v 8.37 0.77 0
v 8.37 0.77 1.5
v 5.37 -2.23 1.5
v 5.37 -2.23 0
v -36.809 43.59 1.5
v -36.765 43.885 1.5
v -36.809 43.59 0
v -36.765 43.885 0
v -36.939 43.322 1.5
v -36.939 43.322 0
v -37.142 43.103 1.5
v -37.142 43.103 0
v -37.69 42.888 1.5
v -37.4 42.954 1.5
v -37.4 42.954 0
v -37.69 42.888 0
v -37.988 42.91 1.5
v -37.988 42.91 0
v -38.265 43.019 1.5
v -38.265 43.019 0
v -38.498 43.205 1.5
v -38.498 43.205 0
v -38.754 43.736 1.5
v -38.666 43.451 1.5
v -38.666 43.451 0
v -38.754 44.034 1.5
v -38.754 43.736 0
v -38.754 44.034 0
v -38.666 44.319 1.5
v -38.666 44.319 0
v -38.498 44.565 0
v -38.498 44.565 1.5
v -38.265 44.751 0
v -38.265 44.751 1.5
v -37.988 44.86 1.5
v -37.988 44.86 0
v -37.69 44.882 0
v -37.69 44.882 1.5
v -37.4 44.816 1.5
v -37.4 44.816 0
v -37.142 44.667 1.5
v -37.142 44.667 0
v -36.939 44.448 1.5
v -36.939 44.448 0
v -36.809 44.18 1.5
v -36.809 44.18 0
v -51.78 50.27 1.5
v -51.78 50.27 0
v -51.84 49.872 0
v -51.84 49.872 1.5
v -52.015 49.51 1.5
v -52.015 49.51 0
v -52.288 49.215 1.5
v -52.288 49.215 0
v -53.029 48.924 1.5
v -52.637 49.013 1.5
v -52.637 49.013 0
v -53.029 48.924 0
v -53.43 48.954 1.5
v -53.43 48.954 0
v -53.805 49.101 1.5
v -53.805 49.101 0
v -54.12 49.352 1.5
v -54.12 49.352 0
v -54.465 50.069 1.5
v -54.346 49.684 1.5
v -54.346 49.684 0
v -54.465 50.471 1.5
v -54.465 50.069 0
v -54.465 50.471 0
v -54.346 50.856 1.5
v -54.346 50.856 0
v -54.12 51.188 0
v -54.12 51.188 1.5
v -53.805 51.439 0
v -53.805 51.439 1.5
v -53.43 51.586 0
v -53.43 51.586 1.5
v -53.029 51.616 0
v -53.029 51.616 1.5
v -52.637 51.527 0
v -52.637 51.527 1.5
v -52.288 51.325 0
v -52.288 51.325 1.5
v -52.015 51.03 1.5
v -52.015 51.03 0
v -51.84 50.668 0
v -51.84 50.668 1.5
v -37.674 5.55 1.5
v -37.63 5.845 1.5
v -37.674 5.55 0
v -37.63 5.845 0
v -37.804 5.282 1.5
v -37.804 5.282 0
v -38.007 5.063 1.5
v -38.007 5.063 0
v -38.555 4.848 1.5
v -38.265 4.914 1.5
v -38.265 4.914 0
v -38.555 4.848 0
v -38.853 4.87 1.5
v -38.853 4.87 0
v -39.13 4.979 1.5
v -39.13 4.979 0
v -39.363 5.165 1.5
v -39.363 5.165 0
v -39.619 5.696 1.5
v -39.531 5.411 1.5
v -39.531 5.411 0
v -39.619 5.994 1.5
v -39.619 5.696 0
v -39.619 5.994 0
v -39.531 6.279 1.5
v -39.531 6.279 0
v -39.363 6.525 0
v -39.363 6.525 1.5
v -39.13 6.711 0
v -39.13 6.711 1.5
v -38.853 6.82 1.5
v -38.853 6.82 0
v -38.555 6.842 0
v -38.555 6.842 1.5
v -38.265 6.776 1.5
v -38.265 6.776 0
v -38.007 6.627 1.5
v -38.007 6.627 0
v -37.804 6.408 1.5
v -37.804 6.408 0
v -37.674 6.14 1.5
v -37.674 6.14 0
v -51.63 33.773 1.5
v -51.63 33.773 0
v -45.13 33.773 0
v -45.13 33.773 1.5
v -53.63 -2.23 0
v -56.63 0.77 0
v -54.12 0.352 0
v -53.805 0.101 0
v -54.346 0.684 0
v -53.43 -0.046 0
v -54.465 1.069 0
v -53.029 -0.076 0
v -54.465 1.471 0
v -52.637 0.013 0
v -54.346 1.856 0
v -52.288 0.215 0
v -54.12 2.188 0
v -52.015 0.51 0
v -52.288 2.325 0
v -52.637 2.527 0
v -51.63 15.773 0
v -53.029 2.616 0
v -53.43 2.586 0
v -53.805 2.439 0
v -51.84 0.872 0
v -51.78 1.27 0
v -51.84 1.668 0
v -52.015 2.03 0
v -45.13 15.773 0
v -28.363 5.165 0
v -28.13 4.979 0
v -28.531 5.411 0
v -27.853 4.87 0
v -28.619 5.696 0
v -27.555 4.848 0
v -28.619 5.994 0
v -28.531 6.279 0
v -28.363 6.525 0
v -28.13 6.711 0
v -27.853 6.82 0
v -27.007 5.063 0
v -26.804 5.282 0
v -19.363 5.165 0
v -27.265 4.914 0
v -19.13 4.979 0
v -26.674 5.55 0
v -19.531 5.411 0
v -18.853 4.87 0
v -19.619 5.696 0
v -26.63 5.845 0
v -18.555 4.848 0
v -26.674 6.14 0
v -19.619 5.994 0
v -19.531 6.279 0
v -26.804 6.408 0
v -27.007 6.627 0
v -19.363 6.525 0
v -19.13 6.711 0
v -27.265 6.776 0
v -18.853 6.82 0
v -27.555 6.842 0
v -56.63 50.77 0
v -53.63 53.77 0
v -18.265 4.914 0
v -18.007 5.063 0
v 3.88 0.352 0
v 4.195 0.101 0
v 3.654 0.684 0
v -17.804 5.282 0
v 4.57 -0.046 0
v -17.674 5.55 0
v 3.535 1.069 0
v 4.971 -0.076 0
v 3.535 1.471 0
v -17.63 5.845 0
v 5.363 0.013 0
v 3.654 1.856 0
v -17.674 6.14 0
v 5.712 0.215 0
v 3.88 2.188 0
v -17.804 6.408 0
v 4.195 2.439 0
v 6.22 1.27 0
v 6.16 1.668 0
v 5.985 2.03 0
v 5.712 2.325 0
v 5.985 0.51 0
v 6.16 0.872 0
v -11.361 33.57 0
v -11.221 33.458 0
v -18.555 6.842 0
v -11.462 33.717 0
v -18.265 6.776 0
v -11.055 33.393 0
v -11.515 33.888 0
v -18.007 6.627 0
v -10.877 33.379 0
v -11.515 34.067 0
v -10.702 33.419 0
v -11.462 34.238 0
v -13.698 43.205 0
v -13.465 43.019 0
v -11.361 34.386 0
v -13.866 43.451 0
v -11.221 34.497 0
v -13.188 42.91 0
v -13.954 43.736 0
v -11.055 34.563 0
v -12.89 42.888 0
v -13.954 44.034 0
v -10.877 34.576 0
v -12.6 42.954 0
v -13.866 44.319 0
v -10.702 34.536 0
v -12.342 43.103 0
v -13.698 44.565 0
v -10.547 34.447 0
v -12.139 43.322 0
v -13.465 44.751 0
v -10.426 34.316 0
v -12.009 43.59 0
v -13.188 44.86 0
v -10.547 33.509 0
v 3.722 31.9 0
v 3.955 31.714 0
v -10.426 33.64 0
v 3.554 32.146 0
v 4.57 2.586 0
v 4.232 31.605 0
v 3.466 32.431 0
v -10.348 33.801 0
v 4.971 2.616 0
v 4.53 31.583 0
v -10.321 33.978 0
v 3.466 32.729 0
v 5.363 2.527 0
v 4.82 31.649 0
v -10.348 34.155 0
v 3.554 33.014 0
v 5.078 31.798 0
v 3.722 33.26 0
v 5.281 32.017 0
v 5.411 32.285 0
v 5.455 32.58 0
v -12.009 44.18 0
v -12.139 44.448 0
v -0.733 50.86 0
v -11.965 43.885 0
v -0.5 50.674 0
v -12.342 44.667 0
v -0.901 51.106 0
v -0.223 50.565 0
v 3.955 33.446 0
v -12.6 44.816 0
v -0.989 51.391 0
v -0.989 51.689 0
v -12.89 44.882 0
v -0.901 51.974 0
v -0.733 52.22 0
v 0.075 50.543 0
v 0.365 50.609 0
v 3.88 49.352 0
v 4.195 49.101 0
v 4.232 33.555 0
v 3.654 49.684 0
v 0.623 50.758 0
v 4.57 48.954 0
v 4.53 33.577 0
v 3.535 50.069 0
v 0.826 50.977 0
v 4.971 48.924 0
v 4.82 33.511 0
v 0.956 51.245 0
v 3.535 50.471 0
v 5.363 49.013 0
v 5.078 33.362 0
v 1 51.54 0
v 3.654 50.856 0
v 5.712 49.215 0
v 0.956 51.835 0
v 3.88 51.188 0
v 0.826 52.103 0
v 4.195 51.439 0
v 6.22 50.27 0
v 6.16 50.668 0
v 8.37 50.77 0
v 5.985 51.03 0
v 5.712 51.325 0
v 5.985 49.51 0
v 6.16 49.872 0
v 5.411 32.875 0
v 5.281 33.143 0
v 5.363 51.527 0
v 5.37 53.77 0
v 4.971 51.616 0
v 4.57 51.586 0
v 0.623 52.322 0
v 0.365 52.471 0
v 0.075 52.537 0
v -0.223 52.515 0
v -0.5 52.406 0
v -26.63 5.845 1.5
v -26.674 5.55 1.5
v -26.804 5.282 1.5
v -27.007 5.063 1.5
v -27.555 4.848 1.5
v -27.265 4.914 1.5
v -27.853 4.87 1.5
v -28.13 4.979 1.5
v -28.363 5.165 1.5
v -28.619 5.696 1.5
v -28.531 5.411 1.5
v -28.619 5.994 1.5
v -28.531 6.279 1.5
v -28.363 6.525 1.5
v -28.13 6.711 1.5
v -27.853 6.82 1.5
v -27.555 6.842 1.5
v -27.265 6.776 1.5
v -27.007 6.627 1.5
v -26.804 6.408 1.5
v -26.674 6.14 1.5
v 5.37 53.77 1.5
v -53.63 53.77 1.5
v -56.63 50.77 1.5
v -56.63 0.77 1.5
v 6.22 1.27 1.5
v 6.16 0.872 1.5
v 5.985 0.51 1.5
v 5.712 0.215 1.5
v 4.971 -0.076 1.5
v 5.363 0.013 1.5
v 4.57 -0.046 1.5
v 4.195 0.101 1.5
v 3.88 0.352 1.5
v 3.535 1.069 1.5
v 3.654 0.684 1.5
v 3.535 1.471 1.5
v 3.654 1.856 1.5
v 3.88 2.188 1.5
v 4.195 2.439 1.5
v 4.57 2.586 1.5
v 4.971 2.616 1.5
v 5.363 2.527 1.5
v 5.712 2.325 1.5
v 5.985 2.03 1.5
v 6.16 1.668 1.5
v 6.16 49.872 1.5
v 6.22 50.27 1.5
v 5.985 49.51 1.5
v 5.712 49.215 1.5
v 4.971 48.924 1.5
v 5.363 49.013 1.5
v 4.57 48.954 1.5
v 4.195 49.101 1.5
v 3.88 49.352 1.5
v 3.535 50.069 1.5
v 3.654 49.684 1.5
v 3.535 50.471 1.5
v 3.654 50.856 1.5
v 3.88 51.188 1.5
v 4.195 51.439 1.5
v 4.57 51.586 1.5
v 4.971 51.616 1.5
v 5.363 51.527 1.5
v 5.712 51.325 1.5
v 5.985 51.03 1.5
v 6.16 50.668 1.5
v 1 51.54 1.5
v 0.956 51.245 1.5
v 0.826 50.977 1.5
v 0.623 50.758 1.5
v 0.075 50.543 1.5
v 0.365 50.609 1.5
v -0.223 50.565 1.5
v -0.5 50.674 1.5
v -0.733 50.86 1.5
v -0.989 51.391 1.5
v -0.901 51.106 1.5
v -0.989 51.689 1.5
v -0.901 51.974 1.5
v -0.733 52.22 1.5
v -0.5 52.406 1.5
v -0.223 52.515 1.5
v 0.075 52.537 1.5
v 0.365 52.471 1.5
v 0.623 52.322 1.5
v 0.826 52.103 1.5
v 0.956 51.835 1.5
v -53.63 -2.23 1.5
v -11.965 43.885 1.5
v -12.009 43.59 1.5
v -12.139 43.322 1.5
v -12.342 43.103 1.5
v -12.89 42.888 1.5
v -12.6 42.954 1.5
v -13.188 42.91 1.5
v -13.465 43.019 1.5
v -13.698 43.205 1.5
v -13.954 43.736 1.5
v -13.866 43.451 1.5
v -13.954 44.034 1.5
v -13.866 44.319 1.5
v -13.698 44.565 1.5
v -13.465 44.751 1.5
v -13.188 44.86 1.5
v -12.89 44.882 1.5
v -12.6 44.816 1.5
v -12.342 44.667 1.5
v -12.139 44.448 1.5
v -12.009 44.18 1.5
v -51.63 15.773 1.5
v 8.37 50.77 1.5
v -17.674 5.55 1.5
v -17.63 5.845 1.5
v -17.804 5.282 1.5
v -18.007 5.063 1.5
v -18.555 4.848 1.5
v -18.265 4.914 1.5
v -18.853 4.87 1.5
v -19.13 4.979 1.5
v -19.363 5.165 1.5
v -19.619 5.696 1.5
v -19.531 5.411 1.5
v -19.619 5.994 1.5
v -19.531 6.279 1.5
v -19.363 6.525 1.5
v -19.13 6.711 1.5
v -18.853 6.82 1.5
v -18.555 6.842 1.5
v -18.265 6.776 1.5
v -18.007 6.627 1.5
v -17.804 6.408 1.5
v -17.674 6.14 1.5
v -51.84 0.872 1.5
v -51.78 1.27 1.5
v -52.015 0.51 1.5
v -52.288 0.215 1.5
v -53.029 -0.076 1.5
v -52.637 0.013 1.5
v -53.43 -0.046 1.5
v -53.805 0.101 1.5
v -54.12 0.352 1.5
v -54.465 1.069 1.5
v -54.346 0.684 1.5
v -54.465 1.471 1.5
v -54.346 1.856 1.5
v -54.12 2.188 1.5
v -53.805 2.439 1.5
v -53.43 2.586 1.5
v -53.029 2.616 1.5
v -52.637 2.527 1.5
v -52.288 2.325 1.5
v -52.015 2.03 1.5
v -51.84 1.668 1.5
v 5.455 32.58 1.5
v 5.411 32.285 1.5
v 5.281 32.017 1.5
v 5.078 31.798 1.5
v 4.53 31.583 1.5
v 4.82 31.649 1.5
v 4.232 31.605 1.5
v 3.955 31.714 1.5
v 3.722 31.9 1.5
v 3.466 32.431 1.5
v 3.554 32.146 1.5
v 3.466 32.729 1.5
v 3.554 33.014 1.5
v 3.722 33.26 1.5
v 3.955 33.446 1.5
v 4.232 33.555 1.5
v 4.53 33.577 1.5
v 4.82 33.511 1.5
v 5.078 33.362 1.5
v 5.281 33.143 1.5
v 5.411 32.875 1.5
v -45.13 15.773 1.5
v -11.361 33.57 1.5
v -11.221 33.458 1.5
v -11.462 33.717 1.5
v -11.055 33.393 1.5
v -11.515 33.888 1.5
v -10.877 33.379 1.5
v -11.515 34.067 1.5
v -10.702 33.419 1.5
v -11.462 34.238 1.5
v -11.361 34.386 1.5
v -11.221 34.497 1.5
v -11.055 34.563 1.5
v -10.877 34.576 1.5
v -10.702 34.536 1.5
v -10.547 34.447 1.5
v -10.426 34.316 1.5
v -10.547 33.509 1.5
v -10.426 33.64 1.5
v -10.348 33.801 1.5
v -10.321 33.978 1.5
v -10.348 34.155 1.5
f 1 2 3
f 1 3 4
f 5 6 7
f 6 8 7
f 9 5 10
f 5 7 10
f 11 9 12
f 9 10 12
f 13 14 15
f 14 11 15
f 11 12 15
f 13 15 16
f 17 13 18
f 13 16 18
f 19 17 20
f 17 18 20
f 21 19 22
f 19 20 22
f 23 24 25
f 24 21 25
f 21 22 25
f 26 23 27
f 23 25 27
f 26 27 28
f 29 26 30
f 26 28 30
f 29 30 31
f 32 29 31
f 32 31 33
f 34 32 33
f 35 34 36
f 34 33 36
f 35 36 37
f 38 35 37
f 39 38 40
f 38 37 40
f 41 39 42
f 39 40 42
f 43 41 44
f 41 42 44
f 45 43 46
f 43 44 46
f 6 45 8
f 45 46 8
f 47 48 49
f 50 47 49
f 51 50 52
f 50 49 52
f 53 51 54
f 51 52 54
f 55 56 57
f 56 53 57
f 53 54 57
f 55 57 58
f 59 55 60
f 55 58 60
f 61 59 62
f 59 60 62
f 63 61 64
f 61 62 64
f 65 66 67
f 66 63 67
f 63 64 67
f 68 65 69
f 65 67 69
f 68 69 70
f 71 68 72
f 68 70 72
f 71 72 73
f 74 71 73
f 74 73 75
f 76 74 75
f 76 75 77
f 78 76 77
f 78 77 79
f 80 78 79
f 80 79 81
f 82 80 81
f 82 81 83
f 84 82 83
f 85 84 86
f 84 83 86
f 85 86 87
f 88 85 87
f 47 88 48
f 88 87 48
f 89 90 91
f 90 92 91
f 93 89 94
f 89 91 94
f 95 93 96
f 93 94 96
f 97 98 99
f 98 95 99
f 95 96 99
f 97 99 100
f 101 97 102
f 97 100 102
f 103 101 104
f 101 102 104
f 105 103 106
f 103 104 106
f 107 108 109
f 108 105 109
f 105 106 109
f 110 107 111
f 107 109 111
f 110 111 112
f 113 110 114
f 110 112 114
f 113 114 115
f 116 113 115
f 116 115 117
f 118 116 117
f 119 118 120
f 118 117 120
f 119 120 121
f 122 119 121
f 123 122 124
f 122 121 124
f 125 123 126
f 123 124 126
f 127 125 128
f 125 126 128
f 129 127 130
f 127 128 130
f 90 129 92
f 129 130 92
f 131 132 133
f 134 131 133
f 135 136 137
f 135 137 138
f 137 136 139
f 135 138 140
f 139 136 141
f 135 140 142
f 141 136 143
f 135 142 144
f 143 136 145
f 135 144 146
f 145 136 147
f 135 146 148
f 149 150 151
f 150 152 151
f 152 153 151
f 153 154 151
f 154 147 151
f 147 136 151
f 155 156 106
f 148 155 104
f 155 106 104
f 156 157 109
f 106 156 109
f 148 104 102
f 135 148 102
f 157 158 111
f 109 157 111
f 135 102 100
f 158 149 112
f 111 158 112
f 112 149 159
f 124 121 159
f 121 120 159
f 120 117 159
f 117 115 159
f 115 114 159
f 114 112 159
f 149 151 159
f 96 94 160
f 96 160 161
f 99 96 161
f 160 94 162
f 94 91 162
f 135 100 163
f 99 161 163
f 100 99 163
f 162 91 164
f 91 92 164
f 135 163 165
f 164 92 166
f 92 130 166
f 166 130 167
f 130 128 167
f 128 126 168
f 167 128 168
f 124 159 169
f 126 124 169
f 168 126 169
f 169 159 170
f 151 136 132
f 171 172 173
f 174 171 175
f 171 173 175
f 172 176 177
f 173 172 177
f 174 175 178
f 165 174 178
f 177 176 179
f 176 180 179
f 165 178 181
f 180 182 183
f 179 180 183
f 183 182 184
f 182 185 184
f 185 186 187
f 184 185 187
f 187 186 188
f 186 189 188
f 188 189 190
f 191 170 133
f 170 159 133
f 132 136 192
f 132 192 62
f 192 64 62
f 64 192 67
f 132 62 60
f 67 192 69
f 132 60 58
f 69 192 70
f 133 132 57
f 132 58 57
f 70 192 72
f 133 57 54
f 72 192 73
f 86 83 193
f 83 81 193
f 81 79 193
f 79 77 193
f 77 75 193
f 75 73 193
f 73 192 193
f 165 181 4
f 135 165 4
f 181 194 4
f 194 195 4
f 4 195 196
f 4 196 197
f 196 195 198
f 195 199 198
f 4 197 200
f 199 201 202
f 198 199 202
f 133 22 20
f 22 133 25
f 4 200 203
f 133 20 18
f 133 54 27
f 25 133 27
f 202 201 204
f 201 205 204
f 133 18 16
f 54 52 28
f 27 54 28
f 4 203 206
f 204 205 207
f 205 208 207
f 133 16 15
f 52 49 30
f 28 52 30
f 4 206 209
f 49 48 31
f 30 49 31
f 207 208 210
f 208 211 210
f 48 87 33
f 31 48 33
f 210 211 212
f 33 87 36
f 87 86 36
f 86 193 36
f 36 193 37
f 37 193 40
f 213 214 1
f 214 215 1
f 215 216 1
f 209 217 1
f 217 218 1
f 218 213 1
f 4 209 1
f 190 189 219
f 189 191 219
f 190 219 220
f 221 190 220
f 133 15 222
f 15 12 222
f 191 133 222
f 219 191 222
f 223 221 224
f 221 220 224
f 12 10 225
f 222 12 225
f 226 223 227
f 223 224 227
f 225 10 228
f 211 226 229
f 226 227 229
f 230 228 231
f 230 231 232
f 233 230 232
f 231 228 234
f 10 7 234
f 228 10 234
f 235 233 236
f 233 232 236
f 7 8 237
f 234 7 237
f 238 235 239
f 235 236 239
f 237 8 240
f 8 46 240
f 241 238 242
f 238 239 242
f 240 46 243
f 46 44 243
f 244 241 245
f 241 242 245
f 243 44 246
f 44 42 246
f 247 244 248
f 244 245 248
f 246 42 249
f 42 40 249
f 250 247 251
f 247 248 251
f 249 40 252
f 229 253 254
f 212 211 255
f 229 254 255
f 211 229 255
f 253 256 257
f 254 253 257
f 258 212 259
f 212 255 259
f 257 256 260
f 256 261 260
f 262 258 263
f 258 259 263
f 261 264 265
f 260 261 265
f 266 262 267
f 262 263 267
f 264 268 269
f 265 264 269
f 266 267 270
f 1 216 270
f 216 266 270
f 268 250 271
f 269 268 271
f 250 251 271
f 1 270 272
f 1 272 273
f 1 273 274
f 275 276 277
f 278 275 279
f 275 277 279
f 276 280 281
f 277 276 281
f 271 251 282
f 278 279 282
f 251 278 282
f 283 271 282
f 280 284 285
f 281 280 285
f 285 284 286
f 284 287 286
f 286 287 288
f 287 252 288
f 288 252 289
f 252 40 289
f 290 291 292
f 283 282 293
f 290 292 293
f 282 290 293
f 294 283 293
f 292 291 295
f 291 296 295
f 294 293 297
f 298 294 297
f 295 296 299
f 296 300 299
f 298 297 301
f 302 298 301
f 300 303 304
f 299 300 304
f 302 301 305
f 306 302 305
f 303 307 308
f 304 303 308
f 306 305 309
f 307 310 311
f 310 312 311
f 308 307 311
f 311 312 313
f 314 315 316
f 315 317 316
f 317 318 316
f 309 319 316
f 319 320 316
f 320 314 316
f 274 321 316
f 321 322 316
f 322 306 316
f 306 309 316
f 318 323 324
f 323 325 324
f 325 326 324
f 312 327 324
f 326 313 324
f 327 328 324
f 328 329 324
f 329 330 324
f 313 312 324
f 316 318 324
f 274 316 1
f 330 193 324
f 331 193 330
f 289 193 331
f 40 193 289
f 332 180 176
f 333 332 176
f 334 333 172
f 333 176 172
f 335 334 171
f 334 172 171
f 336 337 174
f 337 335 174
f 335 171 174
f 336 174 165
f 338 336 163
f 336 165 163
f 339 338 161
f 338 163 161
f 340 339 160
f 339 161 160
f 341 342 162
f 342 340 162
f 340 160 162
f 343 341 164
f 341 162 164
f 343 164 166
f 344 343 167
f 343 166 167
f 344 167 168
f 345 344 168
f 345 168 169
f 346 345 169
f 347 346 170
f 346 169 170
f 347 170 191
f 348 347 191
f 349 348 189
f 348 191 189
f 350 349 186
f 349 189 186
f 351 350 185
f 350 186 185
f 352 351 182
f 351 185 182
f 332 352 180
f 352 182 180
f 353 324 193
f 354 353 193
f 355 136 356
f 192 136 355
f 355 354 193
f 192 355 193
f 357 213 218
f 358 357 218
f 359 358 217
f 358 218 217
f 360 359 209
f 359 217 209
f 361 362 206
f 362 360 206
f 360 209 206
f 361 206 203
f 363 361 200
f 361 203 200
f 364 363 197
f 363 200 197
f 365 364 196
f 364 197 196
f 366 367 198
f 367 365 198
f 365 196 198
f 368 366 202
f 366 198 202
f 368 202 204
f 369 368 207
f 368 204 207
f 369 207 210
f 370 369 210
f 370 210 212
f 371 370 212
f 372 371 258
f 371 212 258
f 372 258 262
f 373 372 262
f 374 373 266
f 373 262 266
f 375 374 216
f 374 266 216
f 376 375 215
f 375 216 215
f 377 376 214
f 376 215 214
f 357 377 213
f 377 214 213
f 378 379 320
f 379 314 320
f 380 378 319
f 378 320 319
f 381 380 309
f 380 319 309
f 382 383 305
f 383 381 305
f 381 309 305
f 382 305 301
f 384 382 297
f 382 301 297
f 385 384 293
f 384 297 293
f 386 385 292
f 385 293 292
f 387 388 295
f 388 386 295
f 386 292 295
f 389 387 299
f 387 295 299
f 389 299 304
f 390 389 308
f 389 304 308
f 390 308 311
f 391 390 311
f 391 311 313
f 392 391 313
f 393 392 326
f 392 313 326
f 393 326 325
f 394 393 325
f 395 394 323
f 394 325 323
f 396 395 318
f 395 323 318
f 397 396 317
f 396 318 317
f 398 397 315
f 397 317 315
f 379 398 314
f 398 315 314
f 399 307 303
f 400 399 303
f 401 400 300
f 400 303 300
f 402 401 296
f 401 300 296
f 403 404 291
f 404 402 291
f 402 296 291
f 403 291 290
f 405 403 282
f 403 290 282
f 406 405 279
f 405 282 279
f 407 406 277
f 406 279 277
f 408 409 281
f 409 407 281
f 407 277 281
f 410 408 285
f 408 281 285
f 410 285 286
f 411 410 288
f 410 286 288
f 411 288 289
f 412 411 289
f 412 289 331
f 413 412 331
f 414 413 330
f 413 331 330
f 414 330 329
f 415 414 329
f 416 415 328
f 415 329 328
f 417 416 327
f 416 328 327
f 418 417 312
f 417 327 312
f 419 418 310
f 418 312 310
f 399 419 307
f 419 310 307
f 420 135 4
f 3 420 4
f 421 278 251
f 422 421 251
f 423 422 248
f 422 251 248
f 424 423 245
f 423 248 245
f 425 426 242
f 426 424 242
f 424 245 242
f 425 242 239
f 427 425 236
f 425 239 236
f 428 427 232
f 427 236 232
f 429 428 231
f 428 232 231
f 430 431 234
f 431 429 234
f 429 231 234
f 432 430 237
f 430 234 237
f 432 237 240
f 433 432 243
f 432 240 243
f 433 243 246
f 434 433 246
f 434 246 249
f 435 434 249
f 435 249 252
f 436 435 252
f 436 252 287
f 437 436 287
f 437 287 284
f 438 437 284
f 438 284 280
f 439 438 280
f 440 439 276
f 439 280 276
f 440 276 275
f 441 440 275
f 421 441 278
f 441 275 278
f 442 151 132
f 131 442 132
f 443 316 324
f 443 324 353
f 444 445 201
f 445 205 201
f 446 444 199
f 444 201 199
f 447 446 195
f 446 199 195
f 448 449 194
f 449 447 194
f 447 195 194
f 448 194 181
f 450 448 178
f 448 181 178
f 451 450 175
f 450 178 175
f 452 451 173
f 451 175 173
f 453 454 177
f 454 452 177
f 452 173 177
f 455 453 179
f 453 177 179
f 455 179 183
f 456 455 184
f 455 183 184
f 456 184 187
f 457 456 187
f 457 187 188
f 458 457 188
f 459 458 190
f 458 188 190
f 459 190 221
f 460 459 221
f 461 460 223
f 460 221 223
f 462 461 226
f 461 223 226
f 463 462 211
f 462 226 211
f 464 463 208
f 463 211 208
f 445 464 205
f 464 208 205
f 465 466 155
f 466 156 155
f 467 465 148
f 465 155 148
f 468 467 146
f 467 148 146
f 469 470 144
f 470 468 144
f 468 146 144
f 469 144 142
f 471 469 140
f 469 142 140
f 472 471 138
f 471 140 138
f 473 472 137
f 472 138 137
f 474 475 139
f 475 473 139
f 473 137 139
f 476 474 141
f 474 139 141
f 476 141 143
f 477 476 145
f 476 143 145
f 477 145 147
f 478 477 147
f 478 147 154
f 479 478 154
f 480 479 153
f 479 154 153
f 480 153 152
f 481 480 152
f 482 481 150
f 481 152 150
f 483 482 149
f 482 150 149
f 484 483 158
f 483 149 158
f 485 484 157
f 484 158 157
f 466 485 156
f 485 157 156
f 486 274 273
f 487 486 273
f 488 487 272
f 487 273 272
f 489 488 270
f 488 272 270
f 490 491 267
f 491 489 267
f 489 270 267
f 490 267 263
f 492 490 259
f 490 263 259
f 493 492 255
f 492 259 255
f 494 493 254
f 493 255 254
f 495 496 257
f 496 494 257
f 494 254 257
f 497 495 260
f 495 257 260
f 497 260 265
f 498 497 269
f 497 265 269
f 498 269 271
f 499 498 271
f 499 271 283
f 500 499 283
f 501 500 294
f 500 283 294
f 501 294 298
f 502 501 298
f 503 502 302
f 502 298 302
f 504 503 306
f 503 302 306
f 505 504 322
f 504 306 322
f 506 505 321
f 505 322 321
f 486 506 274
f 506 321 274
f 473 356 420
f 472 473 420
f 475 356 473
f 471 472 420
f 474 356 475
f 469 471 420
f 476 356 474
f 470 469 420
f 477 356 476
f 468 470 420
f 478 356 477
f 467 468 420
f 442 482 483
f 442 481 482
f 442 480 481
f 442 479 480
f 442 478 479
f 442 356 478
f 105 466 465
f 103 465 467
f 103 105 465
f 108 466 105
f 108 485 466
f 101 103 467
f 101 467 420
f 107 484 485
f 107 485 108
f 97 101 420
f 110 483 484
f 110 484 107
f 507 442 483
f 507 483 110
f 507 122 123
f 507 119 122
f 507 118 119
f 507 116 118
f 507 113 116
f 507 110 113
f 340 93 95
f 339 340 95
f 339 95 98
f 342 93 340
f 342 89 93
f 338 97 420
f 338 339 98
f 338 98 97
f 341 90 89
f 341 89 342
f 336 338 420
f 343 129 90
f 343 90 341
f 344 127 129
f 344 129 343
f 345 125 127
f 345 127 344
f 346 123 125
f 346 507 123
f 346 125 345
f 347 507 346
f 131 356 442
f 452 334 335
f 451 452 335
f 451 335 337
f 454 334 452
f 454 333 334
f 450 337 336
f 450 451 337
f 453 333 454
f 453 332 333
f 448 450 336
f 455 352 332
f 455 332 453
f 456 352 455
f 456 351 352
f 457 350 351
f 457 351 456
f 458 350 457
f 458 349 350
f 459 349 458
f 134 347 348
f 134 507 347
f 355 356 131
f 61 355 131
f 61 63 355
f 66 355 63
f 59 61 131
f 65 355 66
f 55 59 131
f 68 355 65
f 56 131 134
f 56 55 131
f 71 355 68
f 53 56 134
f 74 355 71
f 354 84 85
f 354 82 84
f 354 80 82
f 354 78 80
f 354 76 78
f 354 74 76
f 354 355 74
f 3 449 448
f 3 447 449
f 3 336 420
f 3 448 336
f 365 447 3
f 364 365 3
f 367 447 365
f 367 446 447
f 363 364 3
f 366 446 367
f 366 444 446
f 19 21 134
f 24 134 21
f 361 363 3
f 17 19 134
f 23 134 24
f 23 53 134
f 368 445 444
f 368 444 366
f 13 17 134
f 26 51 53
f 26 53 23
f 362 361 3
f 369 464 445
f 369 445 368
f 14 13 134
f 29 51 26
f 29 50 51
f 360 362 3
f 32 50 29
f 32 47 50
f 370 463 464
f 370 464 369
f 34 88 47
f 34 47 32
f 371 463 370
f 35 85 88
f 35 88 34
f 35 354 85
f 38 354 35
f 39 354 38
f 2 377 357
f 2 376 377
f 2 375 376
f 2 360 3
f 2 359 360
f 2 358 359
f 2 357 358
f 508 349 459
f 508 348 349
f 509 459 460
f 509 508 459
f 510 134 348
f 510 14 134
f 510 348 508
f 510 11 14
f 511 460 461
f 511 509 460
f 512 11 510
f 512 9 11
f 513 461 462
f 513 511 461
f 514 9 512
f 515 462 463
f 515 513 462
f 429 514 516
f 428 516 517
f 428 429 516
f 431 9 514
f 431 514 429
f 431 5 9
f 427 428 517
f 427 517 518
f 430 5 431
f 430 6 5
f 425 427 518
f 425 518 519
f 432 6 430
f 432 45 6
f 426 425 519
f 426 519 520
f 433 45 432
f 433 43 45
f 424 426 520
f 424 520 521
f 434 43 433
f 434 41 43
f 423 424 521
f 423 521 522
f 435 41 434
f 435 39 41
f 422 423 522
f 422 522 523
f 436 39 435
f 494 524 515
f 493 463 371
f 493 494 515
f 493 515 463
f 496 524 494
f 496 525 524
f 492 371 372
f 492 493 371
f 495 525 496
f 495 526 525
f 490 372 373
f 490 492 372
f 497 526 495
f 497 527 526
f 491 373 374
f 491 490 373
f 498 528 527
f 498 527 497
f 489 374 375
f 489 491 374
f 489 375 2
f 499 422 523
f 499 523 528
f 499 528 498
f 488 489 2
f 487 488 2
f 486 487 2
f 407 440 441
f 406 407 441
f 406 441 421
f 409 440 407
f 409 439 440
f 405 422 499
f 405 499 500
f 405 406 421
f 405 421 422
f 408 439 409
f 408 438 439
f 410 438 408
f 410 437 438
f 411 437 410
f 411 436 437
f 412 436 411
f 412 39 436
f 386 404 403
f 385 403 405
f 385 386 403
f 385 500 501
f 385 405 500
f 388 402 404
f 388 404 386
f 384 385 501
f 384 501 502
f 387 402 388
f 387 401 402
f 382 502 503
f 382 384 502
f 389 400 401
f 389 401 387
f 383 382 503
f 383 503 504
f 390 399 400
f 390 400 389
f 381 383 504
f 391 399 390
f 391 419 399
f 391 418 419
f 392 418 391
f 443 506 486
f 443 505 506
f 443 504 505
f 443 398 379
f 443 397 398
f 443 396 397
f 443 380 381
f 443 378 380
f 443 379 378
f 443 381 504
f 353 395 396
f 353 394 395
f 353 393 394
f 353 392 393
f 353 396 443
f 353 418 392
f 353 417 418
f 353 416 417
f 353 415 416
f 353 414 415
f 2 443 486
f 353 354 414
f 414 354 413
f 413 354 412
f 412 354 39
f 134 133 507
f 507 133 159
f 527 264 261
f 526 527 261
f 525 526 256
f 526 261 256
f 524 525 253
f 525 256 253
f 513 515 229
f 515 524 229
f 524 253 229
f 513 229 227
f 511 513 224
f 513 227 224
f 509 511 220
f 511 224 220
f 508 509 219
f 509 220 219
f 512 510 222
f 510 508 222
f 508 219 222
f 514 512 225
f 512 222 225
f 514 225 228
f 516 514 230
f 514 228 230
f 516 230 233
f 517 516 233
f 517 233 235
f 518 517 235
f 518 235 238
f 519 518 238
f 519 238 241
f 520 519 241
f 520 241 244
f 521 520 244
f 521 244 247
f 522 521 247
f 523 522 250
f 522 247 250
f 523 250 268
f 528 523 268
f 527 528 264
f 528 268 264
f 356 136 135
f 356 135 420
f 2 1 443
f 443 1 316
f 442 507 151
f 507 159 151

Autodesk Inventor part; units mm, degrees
ref_plane "YZ Plane" through (0, 0, 0) normal (1, 0, 0) x (0, 1, 0)
ref_plane "XZ Plane" through (0, 0, 0) normal (0, 1, 0) x (-1, 0, 0)
ref_plane "XY Plane" through (0, 0, 0) normal (0, 0, 1) x (1, 0, 0)
sketch "Эскиз1" plane through (0, 0, 0) normal (0, 0, 1) x (1, 0, 0)
  line L0 (-73.63, -2.23) -> (5.37, -2.23) projected
  arc A0 (5.37, -2.23) -> (8.37, 0.77) centre (5.37, 0.77) ccw projected
  line L1 (8.37, 0.77) -> (8.37, 50.77) projected
  arc A1 (8.37, 50.77) -> (5.37, 53.77) centre (5.37, 50.77) ccw projected
  line L2 (5.37, 53.77) -> (-73.63, 53.77) projected
  arc A2 (-73.63, 53.77) -> (-76.63, 50.77) centre (-73.63, 50.77) ccw projected
  line L3 (-76.63, 50.77) -> (-76.63, 0.77) projected
  arc A3 (-76.63, 0.77) -> (-73.63, -2.23) centre (-73.63, 0.77) ccw projected
  circle A4 centre (4.87, 50.27) radius 1.35 projected
  circle A5 centre (-53.13, 50.27) radius 1.35 projected
  circle A6 centre (0.07, 48.67) radius 0.325 projected
  circle A7 centre (-5.73, 48.67) radius 0.325 projected
  circle A8 centre (-68.88, 49.235) radius 1.65 projected
  circle A9 centre (4.87, 44.27) radius 1.55 projected
  circle A10 centre (-68.88, 37.805) radius 1.65 projected
  circle A11 centre (-53.13, 7.27) radius 1.55 projected
  circle A12 centre (4.87, 1.27) radius 1.35 projected
  circle A13 centre (-53.13, 1.27) radius 1.35 projected
  line L4 (5.37, -2.23) -> (8.37, -2.23) construction
  line L5 (8.37, -2.23) -> (8.37, 0.77) construction
  line L6 (8.37, 0.77) -> (5.37, 0.77) construction
  line L7 (5.37, 0.77) -> (5.37, -2.23) construction
  line L8 (8.37, -2.23) -> (-56.63, -2.23)
  line L9 (-56.63, -2.23) -> (-56.63, 53.77)
  line L10 (-56.63, 53.77) -> (8.37, 53.77)
  line L11 (8.37, 53.77) -> (8.37, -2.23)
  line L12 (8.37, -2.23) -> (-56.63, -2.23)
  line L13 (-56.63, -2.23) -> (-56.63, -13.23)
  line L14 (-56.63, -13.23) -> (8.37, -13.23)
  line L15 (8.37, -13.23) -> (8.37, -2.23)
  line L16 (-56.63, 53.77) -> (8.37, 53.77)
  line L17 (8.37, 53.77) -> (8.37, 61.77)
  line L18 (8.37, 61.77) -> (-56.63, 61.77)
  line L19 (-56.63, 61.77) -> (-56.63, 53.77)
  line L20 (0.1, 51.34) -> (-0.1, 51.34) construction
  line L21 (-0.1, 51.34) -> (-0.1, 51.74) construction
  line L22 (0.1, 51.74) -> (-0.1, 51.74) construction
  line L23 (0.1, 51.34) -> (0.1, 51.74) construction
  line L24 (0, 51.74) -> (0, 51.34) construction
  line L25 (0.1, 51.54) -> (-0.1, 51.54) construction
  circle A14 centre (0, 51.54) radius 1
  line L26 (4.5478, 32.4872) -> (4.3622, 32.4872) construction
  line L27 (4.3622, 32.4872) -> (4.3622, 32.6728) construction
  line L28 (4.3622, 32.6728) -> (4.5478, 32.6728) construction
  line L29 (4.5478, 32.6728) -> (4.5478, 32.4872) construction
  line L30 (4.455, 32.4872) -> (4.455, 32.6728) construction
  line L31 (4.5478, 32.58) -> (4.3622, 32.58) construction
  circle A15 centre (4.455, 32.58) radius 1
  line L32 (-37.8578, 43.7922) -> (-37.8578, 43.9778) construction
  line L33 (-37.8578, 43.9778) -> (-37.6722, 43.9778) construction
  line L34 (-37.6722, 43.9778) -> (-37.6722, 43.7922) construction
  line L35 (-37.6722, 43.7922) -> (-37.8578, 43.7922) construction
  line L36 (-37.765, 43.7922) -> (-37.765, 43.9778) construction
  line L37 (-37.6722, 43.885) -> (-37.8578, 43.885) construction
  circle A16 centre (-37.765, 43.885) radius 1
  line L38 (-14.8578, 43.7922) -> (-14.8578, 43.9778) construction
  line L39 (-14.8578, 43.9778) -> (-14.6722, 43.9778) construction
  line L40 (-14.6722, 43.9778) -> (-14.6722, 43.7922) construction
  line L41 (-14.6722, 43.7922) -> (-14.8578, 43.7922) construction
  line L42 (-14.765, 43.7922) -> (-14.765, 43.9778) construction
  line L43 (-14.6722, 43.885) -> (-14.8578, 43.885) construction
  circle A17 centre (-14.765, 43.885) radius 1 construction
  circle A18 centre (-10.9214, 33.9778) radius 0.85 construction
  circle A19 centre (-10.9214, 33.9778) radius 0.6 projected
  line L44 (-18.88, 5.47) -> (-18.38, 5.47) construction
  line L45 (-18.88, 5.47) -> (-18.88, 6.22) construction
  line L46 (-18.88, 6.22) -> (-18.38, 6.22) construction
  line L47 (-18.38, 5.47) -> (-18.38, 6.22) construction
  line L48 (-27.88, 5.47) -> (-27.38, 5.47) construction
  line L49 (-27.88, 5.47) -> (-27.88, 6.22) construction
  line L50 (-27.88, 6.22) -> (-27.38, 6.22) construction
  line L51 (-27.38, 5.47) -> (-27.38, 6.22) construction
  line L52 (-38.88, 5.47) -> (-38.38, 5.47) construction
  line L53 (-38.88, 5.47) -> (-38.88, 6.22) construction
  line L54 (-38.88, 6.22) -> (-38.38, 6.22) construction
  line L55 (-38.38, 5.47) -> (-38.38, 6.22) construction
  line L56 (-18.38, 5.845) -> (-18.88, 5.845) construction
  line L57 (-18.63, 5.47) -> (-18.63, 6.22) construction
  circle A20 centre (-18.63, 5.845) radius 1
  line L58 (-27.38, 5.845) -> (-27.88, 5.845) construction
  line L59 (-27.63, 5.47) -> (-27.63, 6.22) construction
  line L60 (-38.38, 5.845) -> (-38.88, 5.845) construction
  line L61 (-38.63, 5.47) -> (-38.63, 6.22) construction
  circle A21 centre (-38.63, 5.845) radius 1
  circle A22 centre (-27.63, 5.845) radius 1
  line L62 (-14.765, 43.885) -> (-12.965, 43.885) construction
  circle A23 centre (-12.965, 43.885) radius 1
  line L63 (-56.63, 53.77) -> (-51.63, 53.77) construction
  line L64 (-51.63, 53.77) -> (-51.63, 33.773) construction
  line L65 (-51.63, 33.773) -> (-56.63, 33.773) construction
  line L66 (-56.63, 33.773) -> (-56.63, 53.77) construction
  line L67 (-51.63, 33.773) -> (-45.13, 33.773)
  line L68 (-45.13, 33.773) -> (-45.13, 15.773)
  line L69 (-45.13, 15.773) -> (-51.63, 15.773)
  line L70 (-51.63, 15.773) -> (-51.63, 33.773)
  point P0 (0, 0)
  point P1 (8.37, 0.77)
  point P2 (8.37, 53.77)
  dimension "d0" = 65
  dimension "d1" = 56
  dimension "d8" = 65
  dimension "d9" = 11
  dimension "d10" = 8
  dimension "d11" = 2
  dimension "d12" = 2
  dimension "d13" = 2
  dimension "d14" = 2
  dimension "d15" = 2
  dimension "d16" = 2
  dimension "d17" = 2
  dimension "d21" = 1.8
  dimension "d22" = 2
  dimension "d23" = 5
  dimension "d24" = 19.997
  dimension "d25" = 6.5
  dimension "d26" = 18
extrude "Выдавливание1" add sketch "Эскиз1" along normal blind 1.5 contours L9 L2 A1 L1 A0 L0 | A0 L11 L8 | L10 L11 A1 | A6 | A7 | A9 | A11
chamfer "Фаска1" distance 3 angle 45 4 edges at (8.37, -2.23, 0.75) (8.37, 53.77, 0.75) (-56.63, 53.77, 0.75) (-56.63, -2.23, 0.75)
properties part number "board_rpi"
